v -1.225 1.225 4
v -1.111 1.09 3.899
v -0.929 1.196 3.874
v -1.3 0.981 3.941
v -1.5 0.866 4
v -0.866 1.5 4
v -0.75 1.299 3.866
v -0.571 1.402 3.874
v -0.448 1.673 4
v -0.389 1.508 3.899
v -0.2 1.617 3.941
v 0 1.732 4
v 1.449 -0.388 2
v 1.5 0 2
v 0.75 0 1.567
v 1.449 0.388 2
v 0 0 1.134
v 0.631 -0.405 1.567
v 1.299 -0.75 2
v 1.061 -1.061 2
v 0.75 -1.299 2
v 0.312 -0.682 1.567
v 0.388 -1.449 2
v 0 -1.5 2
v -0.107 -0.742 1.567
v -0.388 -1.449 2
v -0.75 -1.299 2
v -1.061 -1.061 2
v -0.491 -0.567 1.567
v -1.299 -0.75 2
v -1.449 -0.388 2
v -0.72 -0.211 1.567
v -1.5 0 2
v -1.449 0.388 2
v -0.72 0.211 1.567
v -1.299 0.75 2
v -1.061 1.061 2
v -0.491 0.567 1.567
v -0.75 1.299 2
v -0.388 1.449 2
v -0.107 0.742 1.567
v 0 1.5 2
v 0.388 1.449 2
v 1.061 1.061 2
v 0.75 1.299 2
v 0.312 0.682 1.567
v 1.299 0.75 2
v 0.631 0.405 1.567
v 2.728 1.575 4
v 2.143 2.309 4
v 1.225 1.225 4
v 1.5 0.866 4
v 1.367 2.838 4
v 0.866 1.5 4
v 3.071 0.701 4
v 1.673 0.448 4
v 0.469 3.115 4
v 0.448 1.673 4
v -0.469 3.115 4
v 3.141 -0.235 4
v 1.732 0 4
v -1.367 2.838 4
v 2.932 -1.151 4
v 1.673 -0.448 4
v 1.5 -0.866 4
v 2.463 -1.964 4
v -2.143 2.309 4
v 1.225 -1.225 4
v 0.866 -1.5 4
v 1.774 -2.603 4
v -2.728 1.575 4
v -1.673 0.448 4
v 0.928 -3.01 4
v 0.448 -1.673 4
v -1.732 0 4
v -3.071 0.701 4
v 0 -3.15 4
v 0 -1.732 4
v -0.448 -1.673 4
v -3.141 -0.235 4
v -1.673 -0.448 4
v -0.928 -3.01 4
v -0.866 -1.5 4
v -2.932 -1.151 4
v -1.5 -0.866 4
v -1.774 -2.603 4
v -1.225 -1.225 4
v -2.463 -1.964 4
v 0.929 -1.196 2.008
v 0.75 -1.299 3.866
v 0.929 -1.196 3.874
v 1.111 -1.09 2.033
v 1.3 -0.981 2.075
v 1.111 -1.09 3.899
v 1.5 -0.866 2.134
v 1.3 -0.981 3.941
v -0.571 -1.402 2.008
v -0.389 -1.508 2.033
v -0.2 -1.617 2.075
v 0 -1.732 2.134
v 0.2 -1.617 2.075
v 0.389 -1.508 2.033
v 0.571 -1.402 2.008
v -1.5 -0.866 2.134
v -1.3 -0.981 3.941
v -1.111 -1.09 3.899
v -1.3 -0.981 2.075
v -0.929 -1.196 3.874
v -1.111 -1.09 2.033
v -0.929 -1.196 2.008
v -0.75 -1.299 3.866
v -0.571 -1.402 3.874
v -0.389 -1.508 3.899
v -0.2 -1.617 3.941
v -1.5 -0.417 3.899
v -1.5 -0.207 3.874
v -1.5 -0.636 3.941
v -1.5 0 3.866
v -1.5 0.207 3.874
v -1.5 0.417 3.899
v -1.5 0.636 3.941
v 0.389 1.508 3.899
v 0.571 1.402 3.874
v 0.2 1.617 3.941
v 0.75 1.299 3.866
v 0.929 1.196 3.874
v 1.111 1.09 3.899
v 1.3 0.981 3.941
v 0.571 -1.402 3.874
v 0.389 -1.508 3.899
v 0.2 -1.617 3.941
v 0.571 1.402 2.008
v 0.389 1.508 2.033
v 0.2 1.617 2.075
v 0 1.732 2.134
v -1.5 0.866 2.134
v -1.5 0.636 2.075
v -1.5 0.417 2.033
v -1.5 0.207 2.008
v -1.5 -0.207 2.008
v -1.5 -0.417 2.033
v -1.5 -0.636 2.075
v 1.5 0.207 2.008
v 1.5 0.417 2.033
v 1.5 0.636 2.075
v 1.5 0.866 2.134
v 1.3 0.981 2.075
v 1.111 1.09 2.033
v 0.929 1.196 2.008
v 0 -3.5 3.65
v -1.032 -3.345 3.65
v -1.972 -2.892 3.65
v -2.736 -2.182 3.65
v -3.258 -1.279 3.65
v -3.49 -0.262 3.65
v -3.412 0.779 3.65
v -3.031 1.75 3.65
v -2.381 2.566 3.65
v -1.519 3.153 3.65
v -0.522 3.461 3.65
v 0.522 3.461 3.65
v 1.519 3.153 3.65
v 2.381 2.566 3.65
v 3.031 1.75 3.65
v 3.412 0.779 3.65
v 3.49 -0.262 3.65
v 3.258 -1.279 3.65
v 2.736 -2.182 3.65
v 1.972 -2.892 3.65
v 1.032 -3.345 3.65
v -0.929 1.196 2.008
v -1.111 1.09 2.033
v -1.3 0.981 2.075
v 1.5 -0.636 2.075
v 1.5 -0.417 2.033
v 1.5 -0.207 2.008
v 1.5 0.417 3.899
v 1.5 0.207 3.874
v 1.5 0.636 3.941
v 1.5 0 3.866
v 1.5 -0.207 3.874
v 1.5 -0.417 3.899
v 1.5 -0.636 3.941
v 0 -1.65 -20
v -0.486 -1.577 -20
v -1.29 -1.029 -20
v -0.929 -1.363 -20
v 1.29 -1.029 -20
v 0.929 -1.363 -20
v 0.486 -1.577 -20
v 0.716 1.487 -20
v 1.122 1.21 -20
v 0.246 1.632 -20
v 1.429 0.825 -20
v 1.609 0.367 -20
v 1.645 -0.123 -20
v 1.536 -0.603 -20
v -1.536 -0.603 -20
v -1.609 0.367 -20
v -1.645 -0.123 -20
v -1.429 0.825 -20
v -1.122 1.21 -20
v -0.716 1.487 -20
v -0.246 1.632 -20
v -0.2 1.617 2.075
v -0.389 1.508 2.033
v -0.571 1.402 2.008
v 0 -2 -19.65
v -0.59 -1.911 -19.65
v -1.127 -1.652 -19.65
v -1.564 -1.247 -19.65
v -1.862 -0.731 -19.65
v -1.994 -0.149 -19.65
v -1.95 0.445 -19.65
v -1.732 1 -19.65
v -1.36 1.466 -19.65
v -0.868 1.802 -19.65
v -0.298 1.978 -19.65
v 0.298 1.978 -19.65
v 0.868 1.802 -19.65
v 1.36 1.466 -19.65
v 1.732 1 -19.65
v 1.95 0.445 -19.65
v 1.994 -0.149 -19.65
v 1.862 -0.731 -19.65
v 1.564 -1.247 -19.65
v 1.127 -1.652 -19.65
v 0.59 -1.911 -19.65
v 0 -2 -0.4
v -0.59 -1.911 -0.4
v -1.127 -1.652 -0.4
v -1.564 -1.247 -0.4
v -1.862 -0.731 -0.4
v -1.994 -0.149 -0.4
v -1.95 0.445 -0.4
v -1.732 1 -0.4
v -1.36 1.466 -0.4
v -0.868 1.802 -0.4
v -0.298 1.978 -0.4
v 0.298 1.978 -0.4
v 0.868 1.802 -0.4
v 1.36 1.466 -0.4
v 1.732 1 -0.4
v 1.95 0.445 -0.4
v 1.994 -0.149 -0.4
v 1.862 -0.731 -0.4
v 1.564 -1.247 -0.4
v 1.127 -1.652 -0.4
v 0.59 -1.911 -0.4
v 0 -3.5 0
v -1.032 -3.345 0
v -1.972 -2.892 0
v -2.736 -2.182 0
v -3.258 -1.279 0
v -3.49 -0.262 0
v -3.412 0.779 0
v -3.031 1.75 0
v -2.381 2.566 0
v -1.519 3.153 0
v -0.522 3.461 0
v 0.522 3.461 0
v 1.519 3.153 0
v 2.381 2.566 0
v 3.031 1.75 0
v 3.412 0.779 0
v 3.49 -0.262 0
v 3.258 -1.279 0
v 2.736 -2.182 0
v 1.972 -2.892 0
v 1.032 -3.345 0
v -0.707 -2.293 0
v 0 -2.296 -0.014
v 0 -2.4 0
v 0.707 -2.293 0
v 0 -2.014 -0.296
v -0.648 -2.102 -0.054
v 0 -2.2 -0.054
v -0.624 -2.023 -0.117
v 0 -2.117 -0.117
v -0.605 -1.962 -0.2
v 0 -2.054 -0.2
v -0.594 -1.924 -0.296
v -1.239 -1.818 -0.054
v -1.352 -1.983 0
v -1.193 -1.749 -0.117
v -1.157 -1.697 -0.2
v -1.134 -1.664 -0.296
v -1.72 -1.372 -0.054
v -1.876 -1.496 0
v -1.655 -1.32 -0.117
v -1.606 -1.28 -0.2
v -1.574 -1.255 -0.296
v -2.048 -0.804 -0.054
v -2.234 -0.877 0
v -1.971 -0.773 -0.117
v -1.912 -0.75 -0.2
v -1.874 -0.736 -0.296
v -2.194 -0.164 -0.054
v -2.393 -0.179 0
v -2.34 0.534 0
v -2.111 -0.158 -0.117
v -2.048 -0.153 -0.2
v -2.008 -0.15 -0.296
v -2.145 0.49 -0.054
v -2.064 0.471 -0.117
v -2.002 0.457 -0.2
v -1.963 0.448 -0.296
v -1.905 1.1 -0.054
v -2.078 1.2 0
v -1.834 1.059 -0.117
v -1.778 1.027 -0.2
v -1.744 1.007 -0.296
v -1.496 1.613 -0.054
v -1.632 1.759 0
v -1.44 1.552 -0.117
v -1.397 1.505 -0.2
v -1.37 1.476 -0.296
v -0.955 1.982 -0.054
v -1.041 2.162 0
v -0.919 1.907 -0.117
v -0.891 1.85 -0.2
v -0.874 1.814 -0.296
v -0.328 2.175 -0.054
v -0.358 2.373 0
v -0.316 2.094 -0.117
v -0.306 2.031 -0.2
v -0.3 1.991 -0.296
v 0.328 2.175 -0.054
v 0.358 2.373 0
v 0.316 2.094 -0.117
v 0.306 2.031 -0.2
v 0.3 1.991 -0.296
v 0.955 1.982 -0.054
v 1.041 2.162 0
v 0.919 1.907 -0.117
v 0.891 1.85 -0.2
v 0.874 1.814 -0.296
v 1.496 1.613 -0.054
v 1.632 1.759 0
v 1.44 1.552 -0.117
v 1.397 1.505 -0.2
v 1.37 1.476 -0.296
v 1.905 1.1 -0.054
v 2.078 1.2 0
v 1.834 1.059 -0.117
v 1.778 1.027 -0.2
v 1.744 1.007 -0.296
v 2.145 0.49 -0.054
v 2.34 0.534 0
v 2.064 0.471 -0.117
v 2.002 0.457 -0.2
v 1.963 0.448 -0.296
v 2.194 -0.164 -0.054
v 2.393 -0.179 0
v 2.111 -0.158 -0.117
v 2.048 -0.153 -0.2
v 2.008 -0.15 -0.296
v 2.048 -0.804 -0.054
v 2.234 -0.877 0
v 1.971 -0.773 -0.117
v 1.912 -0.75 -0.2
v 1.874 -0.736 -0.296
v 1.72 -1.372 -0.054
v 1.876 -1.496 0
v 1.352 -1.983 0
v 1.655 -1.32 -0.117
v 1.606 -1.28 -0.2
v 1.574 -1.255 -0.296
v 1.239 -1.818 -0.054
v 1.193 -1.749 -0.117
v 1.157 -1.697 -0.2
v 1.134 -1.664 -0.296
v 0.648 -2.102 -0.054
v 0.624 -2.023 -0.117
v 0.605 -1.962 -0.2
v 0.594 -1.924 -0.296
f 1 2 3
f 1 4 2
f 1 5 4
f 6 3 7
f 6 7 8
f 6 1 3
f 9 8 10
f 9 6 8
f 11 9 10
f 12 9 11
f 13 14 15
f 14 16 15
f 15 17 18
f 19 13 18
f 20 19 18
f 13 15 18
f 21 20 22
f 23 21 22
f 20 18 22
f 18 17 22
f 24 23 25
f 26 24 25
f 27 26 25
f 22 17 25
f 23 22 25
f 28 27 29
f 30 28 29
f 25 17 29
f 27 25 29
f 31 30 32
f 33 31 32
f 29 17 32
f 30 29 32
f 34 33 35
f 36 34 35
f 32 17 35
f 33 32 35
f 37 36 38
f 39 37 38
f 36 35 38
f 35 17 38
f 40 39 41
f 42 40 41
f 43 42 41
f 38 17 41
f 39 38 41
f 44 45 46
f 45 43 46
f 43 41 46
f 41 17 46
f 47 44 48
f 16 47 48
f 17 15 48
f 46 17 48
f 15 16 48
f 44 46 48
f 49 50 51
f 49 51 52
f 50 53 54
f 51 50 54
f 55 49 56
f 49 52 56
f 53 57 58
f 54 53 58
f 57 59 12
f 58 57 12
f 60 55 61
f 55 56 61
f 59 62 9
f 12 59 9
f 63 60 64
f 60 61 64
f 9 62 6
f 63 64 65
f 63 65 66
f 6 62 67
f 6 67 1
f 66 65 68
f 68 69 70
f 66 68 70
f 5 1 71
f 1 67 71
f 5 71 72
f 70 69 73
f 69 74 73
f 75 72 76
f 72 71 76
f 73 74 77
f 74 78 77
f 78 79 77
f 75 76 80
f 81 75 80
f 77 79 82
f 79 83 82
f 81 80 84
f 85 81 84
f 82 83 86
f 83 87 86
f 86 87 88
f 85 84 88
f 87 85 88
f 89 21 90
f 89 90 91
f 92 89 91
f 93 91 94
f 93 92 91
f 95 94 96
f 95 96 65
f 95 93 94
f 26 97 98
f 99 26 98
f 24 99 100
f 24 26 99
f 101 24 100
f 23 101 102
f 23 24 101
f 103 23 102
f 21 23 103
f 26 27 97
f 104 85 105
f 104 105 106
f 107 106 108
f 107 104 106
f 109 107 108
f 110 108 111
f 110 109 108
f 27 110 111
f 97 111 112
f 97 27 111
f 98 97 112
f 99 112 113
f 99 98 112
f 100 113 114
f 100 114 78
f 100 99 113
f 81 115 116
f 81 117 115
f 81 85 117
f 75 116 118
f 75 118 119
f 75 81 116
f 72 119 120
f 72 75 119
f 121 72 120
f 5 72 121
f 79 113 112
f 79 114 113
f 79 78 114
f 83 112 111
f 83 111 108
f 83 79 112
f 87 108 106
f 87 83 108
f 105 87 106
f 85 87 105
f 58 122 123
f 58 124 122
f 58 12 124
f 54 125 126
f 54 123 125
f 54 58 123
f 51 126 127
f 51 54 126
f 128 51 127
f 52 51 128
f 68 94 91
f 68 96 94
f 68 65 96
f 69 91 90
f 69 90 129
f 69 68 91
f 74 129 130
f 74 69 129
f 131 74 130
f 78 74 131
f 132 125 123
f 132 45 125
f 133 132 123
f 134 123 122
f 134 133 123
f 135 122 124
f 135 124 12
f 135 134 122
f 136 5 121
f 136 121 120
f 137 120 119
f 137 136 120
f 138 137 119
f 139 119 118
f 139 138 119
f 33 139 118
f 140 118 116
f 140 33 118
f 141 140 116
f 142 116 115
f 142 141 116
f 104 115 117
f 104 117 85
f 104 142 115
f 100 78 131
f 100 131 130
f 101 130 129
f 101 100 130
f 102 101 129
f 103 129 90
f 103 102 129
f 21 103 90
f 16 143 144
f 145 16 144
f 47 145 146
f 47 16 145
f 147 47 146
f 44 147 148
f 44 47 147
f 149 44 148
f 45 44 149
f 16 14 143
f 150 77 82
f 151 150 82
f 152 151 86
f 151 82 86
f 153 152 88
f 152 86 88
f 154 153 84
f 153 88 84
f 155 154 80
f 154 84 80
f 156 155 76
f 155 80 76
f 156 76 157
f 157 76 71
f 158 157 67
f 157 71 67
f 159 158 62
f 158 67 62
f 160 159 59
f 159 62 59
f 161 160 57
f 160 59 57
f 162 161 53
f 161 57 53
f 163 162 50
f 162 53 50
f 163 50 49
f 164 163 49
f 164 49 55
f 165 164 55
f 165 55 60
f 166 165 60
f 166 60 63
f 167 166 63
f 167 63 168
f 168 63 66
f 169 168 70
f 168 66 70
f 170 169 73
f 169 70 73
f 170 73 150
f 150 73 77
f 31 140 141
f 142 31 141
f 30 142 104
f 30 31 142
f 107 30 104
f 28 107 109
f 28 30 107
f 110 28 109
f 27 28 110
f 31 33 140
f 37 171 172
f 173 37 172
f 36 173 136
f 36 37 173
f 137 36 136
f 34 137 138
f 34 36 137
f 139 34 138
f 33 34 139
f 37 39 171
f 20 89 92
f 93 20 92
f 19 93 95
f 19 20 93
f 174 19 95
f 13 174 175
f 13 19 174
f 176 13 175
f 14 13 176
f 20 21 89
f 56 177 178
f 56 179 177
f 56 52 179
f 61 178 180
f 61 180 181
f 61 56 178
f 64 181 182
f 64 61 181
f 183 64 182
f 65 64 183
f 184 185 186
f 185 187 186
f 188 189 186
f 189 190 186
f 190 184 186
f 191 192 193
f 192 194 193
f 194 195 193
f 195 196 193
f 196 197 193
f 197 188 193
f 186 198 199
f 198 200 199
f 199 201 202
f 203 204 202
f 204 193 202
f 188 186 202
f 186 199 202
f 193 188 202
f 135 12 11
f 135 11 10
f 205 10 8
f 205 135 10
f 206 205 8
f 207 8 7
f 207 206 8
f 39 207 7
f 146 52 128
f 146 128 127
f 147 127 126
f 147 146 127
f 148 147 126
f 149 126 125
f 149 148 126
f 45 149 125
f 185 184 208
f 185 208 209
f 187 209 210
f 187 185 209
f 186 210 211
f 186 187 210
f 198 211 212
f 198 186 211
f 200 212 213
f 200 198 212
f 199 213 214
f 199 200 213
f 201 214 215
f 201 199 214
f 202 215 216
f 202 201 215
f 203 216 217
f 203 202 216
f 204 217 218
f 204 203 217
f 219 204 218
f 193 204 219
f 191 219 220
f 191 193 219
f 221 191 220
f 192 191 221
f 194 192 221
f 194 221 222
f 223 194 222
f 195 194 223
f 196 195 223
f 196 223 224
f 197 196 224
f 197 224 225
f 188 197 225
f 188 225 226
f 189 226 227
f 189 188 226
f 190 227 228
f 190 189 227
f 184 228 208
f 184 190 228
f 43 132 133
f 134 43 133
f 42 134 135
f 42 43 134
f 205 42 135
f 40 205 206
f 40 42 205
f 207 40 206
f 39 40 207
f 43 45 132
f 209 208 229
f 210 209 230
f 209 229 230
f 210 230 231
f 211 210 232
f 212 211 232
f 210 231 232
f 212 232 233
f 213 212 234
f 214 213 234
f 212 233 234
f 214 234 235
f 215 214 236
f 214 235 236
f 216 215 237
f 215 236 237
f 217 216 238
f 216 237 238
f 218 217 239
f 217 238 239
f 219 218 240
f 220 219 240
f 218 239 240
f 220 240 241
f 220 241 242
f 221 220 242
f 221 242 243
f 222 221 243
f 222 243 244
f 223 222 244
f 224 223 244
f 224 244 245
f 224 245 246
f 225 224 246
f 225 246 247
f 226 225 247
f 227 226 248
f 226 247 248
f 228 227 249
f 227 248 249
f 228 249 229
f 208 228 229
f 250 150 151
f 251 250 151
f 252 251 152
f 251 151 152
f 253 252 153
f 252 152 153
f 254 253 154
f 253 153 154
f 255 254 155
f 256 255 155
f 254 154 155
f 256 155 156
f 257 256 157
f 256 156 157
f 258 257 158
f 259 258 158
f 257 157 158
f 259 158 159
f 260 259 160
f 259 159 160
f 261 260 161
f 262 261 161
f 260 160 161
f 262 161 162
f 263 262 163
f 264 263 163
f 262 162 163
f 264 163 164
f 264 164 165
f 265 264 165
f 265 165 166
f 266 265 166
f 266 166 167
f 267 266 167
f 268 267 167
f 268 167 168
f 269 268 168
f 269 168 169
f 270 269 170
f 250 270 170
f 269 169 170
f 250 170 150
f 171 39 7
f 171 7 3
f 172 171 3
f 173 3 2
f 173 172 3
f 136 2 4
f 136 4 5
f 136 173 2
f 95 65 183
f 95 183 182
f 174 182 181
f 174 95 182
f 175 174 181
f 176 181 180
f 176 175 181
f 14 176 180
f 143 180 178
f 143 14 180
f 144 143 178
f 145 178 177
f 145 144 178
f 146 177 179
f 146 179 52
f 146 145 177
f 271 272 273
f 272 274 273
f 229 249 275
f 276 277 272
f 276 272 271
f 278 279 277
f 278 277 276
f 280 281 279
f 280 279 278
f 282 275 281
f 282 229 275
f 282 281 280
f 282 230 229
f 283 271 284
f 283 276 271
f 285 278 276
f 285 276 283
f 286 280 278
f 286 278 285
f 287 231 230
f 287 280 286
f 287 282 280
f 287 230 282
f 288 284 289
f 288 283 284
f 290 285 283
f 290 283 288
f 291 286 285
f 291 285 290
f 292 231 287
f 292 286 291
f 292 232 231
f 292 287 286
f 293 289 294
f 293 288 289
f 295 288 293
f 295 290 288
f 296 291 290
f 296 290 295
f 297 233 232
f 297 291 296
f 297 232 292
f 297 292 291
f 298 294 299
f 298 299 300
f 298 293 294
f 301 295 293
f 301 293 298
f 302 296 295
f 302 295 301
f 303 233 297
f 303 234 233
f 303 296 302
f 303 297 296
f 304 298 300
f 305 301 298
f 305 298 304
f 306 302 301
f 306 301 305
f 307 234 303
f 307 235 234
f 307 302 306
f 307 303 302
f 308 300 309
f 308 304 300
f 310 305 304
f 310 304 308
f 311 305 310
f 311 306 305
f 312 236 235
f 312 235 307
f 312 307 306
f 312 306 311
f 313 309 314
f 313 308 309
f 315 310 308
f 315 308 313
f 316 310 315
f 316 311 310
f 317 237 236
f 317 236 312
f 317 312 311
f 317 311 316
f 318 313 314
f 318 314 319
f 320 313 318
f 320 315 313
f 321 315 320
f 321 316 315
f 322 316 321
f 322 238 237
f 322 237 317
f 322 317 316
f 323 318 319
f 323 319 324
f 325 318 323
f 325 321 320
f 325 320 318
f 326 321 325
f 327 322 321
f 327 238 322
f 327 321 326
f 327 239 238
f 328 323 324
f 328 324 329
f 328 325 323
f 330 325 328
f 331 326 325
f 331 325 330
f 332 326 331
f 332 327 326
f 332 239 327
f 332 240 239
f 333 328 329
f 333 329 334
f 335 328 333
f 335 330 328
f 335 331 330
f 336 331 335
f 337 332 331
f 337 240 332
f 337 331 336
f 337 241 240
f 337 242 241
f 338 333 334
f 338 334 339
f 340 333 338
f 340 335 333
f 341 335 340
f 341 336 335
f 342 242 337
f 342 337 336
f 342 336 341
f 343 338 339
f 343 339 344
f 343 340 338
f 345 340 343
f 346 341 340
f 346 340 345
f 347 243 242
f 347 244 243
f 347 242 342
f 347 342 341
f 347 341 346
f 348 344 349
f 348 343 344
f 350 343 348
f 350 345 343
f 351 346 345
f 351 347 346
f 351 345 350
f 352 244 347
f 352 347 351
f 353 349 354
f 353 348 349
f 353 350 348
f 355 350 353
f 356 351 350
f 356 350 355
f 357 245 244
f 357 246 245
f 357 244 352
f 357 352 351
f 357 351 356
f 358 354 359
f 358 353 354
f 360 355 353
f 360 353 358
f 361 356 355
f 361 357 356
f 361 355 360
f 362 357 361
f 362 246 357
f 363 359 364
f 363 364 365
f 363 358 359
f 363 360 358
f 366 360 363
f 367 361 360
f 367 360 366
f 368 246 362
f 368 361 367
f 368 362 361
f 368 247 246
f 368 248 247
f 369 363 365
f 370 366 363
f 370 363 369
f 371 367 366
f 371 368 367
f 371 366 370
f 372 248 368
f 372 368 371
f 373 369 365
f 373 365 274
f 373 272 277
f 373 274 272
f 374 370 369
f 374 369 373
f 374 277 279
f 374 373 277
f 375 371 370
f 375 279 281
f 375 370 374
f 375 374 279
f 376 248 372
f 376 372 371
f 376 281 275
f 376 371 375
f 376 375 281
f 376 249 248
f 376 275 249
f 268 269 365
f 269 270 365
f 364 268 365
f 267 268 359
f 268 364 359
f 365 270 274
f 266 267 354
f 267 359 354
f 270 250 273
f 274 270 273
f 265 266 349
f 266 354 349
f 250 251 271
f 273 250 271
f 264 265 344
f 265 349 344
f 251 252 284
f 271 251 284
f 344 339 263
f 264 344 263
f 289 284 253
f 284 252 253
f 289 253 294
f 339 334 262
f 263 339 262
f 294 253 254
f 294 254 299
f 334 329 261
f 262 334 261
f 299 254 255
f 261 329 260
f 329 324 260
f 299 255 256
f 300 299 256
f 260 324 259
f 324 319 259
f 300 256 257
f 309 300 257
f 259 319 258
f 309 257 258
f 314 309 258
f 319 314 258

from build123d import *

# Parameters (mm, degrees)
CHAMFER1_SIZE      = 0.35
CUT_EXTRUDE1_REACH = 26.505
FILLET2_R          = 0.4


with BuildPart() as part:
    # Sketch1 → Revolve1 (revolve)
    with BuildSketch(Plane(origin=(0, 0, 0), x_dir=(0, 0, -1), z_dir=(1, 0, 0))):
        Polygon((0, 3.5), (-4, 3.5), (-4, 0), (20, 0), (20, 2), (0, 2), align=None)
    revolve(axis=Axis((0, 0, 4), (0, 0, -1)))

    # Sketch7 → Cut-Revolve2 (revolve, cut)
    with BuildSketch(Plane(origin=(0, 0, 0), x_dir=(0, 0, -1), z_dir=(1, 0, 0))):
        Polygon((-4, 0), (-4, 1.5), (-2, 1.5), (-1.133974596, 0), align=None)
    revolve(axis=Axis((0, 0, 4), (0, 0, -1)), mode=Mode.SUBTRACT)

    # Chamfer1
    chamfer1_edges = [part.edges().sort_by_distance(p)[0] for p in [
        (0, -2, -20),
        (0, -3.5, 4),
    ]]
    chamfer(chamfer1_edges, length=CHAMFER1_SIZE)

    # Cut-Extrude1: up to this cone (the profile starts inside it)
    cut_extrude1_end = Plane(origin=(0, 0, 4), z_dir=(0, 0, 1)).offset(-2.866024404) * Cone(1.732e-06, 60.336209885, 34.835126019, align=(Align.CENTER, Align.CENTER, Align.MIN), mode=Mode.PRIVATE)
    # Sketch8 → Cut-Extrude1 (cut, up to the surface)
    with BuildSketch(Plane.XY.offset(4), mode=Mode.PRIVATE) as cut_extrude1_sk1:
        Polygon((0, 1.732050808), (-1.5, 0.866025404), (-1.5, -0.866025404), (0, -1.732050808), (1.5, -0.866025404), (1.5, 0.866025404), align=None)
    cut_extrude1_tool1 = extrude(cut_extrude1_sk1.sketch, amount=-CUT_EXTRUDE1_REACH, mode=Mode.PRIVATE) & cut_extrude1_end
    add(cut_extrude1_tool1.solids().sort_by_distance((0, 0, 4))[0], mode=Mode.SUBTRACT)

    # Sketch9 → Cut-Revolve3 (revolve, cut)
    with BuildSketch(Plane(origin=(0, 0, 0), x_dir=(0, 0, -1), z_dir=(1, 0, 0))):
        Polygon((-4.5, 2.598076211), (-4.5, 1.5), (-3.866025404, 1.5), align=None)
    revolve(axis=Axis((0, 0, 4), (0, 0, -1)), mode=Mode.SUBTRACT)

    # Fillet2
    fillet2_edges = [part.edges().sort_by_distance(p)[0] for p in [
        (0, -2, 0),
    ]]
    fillet(fillet2_edges, radius=FILLET2_R)


solid = part.part
